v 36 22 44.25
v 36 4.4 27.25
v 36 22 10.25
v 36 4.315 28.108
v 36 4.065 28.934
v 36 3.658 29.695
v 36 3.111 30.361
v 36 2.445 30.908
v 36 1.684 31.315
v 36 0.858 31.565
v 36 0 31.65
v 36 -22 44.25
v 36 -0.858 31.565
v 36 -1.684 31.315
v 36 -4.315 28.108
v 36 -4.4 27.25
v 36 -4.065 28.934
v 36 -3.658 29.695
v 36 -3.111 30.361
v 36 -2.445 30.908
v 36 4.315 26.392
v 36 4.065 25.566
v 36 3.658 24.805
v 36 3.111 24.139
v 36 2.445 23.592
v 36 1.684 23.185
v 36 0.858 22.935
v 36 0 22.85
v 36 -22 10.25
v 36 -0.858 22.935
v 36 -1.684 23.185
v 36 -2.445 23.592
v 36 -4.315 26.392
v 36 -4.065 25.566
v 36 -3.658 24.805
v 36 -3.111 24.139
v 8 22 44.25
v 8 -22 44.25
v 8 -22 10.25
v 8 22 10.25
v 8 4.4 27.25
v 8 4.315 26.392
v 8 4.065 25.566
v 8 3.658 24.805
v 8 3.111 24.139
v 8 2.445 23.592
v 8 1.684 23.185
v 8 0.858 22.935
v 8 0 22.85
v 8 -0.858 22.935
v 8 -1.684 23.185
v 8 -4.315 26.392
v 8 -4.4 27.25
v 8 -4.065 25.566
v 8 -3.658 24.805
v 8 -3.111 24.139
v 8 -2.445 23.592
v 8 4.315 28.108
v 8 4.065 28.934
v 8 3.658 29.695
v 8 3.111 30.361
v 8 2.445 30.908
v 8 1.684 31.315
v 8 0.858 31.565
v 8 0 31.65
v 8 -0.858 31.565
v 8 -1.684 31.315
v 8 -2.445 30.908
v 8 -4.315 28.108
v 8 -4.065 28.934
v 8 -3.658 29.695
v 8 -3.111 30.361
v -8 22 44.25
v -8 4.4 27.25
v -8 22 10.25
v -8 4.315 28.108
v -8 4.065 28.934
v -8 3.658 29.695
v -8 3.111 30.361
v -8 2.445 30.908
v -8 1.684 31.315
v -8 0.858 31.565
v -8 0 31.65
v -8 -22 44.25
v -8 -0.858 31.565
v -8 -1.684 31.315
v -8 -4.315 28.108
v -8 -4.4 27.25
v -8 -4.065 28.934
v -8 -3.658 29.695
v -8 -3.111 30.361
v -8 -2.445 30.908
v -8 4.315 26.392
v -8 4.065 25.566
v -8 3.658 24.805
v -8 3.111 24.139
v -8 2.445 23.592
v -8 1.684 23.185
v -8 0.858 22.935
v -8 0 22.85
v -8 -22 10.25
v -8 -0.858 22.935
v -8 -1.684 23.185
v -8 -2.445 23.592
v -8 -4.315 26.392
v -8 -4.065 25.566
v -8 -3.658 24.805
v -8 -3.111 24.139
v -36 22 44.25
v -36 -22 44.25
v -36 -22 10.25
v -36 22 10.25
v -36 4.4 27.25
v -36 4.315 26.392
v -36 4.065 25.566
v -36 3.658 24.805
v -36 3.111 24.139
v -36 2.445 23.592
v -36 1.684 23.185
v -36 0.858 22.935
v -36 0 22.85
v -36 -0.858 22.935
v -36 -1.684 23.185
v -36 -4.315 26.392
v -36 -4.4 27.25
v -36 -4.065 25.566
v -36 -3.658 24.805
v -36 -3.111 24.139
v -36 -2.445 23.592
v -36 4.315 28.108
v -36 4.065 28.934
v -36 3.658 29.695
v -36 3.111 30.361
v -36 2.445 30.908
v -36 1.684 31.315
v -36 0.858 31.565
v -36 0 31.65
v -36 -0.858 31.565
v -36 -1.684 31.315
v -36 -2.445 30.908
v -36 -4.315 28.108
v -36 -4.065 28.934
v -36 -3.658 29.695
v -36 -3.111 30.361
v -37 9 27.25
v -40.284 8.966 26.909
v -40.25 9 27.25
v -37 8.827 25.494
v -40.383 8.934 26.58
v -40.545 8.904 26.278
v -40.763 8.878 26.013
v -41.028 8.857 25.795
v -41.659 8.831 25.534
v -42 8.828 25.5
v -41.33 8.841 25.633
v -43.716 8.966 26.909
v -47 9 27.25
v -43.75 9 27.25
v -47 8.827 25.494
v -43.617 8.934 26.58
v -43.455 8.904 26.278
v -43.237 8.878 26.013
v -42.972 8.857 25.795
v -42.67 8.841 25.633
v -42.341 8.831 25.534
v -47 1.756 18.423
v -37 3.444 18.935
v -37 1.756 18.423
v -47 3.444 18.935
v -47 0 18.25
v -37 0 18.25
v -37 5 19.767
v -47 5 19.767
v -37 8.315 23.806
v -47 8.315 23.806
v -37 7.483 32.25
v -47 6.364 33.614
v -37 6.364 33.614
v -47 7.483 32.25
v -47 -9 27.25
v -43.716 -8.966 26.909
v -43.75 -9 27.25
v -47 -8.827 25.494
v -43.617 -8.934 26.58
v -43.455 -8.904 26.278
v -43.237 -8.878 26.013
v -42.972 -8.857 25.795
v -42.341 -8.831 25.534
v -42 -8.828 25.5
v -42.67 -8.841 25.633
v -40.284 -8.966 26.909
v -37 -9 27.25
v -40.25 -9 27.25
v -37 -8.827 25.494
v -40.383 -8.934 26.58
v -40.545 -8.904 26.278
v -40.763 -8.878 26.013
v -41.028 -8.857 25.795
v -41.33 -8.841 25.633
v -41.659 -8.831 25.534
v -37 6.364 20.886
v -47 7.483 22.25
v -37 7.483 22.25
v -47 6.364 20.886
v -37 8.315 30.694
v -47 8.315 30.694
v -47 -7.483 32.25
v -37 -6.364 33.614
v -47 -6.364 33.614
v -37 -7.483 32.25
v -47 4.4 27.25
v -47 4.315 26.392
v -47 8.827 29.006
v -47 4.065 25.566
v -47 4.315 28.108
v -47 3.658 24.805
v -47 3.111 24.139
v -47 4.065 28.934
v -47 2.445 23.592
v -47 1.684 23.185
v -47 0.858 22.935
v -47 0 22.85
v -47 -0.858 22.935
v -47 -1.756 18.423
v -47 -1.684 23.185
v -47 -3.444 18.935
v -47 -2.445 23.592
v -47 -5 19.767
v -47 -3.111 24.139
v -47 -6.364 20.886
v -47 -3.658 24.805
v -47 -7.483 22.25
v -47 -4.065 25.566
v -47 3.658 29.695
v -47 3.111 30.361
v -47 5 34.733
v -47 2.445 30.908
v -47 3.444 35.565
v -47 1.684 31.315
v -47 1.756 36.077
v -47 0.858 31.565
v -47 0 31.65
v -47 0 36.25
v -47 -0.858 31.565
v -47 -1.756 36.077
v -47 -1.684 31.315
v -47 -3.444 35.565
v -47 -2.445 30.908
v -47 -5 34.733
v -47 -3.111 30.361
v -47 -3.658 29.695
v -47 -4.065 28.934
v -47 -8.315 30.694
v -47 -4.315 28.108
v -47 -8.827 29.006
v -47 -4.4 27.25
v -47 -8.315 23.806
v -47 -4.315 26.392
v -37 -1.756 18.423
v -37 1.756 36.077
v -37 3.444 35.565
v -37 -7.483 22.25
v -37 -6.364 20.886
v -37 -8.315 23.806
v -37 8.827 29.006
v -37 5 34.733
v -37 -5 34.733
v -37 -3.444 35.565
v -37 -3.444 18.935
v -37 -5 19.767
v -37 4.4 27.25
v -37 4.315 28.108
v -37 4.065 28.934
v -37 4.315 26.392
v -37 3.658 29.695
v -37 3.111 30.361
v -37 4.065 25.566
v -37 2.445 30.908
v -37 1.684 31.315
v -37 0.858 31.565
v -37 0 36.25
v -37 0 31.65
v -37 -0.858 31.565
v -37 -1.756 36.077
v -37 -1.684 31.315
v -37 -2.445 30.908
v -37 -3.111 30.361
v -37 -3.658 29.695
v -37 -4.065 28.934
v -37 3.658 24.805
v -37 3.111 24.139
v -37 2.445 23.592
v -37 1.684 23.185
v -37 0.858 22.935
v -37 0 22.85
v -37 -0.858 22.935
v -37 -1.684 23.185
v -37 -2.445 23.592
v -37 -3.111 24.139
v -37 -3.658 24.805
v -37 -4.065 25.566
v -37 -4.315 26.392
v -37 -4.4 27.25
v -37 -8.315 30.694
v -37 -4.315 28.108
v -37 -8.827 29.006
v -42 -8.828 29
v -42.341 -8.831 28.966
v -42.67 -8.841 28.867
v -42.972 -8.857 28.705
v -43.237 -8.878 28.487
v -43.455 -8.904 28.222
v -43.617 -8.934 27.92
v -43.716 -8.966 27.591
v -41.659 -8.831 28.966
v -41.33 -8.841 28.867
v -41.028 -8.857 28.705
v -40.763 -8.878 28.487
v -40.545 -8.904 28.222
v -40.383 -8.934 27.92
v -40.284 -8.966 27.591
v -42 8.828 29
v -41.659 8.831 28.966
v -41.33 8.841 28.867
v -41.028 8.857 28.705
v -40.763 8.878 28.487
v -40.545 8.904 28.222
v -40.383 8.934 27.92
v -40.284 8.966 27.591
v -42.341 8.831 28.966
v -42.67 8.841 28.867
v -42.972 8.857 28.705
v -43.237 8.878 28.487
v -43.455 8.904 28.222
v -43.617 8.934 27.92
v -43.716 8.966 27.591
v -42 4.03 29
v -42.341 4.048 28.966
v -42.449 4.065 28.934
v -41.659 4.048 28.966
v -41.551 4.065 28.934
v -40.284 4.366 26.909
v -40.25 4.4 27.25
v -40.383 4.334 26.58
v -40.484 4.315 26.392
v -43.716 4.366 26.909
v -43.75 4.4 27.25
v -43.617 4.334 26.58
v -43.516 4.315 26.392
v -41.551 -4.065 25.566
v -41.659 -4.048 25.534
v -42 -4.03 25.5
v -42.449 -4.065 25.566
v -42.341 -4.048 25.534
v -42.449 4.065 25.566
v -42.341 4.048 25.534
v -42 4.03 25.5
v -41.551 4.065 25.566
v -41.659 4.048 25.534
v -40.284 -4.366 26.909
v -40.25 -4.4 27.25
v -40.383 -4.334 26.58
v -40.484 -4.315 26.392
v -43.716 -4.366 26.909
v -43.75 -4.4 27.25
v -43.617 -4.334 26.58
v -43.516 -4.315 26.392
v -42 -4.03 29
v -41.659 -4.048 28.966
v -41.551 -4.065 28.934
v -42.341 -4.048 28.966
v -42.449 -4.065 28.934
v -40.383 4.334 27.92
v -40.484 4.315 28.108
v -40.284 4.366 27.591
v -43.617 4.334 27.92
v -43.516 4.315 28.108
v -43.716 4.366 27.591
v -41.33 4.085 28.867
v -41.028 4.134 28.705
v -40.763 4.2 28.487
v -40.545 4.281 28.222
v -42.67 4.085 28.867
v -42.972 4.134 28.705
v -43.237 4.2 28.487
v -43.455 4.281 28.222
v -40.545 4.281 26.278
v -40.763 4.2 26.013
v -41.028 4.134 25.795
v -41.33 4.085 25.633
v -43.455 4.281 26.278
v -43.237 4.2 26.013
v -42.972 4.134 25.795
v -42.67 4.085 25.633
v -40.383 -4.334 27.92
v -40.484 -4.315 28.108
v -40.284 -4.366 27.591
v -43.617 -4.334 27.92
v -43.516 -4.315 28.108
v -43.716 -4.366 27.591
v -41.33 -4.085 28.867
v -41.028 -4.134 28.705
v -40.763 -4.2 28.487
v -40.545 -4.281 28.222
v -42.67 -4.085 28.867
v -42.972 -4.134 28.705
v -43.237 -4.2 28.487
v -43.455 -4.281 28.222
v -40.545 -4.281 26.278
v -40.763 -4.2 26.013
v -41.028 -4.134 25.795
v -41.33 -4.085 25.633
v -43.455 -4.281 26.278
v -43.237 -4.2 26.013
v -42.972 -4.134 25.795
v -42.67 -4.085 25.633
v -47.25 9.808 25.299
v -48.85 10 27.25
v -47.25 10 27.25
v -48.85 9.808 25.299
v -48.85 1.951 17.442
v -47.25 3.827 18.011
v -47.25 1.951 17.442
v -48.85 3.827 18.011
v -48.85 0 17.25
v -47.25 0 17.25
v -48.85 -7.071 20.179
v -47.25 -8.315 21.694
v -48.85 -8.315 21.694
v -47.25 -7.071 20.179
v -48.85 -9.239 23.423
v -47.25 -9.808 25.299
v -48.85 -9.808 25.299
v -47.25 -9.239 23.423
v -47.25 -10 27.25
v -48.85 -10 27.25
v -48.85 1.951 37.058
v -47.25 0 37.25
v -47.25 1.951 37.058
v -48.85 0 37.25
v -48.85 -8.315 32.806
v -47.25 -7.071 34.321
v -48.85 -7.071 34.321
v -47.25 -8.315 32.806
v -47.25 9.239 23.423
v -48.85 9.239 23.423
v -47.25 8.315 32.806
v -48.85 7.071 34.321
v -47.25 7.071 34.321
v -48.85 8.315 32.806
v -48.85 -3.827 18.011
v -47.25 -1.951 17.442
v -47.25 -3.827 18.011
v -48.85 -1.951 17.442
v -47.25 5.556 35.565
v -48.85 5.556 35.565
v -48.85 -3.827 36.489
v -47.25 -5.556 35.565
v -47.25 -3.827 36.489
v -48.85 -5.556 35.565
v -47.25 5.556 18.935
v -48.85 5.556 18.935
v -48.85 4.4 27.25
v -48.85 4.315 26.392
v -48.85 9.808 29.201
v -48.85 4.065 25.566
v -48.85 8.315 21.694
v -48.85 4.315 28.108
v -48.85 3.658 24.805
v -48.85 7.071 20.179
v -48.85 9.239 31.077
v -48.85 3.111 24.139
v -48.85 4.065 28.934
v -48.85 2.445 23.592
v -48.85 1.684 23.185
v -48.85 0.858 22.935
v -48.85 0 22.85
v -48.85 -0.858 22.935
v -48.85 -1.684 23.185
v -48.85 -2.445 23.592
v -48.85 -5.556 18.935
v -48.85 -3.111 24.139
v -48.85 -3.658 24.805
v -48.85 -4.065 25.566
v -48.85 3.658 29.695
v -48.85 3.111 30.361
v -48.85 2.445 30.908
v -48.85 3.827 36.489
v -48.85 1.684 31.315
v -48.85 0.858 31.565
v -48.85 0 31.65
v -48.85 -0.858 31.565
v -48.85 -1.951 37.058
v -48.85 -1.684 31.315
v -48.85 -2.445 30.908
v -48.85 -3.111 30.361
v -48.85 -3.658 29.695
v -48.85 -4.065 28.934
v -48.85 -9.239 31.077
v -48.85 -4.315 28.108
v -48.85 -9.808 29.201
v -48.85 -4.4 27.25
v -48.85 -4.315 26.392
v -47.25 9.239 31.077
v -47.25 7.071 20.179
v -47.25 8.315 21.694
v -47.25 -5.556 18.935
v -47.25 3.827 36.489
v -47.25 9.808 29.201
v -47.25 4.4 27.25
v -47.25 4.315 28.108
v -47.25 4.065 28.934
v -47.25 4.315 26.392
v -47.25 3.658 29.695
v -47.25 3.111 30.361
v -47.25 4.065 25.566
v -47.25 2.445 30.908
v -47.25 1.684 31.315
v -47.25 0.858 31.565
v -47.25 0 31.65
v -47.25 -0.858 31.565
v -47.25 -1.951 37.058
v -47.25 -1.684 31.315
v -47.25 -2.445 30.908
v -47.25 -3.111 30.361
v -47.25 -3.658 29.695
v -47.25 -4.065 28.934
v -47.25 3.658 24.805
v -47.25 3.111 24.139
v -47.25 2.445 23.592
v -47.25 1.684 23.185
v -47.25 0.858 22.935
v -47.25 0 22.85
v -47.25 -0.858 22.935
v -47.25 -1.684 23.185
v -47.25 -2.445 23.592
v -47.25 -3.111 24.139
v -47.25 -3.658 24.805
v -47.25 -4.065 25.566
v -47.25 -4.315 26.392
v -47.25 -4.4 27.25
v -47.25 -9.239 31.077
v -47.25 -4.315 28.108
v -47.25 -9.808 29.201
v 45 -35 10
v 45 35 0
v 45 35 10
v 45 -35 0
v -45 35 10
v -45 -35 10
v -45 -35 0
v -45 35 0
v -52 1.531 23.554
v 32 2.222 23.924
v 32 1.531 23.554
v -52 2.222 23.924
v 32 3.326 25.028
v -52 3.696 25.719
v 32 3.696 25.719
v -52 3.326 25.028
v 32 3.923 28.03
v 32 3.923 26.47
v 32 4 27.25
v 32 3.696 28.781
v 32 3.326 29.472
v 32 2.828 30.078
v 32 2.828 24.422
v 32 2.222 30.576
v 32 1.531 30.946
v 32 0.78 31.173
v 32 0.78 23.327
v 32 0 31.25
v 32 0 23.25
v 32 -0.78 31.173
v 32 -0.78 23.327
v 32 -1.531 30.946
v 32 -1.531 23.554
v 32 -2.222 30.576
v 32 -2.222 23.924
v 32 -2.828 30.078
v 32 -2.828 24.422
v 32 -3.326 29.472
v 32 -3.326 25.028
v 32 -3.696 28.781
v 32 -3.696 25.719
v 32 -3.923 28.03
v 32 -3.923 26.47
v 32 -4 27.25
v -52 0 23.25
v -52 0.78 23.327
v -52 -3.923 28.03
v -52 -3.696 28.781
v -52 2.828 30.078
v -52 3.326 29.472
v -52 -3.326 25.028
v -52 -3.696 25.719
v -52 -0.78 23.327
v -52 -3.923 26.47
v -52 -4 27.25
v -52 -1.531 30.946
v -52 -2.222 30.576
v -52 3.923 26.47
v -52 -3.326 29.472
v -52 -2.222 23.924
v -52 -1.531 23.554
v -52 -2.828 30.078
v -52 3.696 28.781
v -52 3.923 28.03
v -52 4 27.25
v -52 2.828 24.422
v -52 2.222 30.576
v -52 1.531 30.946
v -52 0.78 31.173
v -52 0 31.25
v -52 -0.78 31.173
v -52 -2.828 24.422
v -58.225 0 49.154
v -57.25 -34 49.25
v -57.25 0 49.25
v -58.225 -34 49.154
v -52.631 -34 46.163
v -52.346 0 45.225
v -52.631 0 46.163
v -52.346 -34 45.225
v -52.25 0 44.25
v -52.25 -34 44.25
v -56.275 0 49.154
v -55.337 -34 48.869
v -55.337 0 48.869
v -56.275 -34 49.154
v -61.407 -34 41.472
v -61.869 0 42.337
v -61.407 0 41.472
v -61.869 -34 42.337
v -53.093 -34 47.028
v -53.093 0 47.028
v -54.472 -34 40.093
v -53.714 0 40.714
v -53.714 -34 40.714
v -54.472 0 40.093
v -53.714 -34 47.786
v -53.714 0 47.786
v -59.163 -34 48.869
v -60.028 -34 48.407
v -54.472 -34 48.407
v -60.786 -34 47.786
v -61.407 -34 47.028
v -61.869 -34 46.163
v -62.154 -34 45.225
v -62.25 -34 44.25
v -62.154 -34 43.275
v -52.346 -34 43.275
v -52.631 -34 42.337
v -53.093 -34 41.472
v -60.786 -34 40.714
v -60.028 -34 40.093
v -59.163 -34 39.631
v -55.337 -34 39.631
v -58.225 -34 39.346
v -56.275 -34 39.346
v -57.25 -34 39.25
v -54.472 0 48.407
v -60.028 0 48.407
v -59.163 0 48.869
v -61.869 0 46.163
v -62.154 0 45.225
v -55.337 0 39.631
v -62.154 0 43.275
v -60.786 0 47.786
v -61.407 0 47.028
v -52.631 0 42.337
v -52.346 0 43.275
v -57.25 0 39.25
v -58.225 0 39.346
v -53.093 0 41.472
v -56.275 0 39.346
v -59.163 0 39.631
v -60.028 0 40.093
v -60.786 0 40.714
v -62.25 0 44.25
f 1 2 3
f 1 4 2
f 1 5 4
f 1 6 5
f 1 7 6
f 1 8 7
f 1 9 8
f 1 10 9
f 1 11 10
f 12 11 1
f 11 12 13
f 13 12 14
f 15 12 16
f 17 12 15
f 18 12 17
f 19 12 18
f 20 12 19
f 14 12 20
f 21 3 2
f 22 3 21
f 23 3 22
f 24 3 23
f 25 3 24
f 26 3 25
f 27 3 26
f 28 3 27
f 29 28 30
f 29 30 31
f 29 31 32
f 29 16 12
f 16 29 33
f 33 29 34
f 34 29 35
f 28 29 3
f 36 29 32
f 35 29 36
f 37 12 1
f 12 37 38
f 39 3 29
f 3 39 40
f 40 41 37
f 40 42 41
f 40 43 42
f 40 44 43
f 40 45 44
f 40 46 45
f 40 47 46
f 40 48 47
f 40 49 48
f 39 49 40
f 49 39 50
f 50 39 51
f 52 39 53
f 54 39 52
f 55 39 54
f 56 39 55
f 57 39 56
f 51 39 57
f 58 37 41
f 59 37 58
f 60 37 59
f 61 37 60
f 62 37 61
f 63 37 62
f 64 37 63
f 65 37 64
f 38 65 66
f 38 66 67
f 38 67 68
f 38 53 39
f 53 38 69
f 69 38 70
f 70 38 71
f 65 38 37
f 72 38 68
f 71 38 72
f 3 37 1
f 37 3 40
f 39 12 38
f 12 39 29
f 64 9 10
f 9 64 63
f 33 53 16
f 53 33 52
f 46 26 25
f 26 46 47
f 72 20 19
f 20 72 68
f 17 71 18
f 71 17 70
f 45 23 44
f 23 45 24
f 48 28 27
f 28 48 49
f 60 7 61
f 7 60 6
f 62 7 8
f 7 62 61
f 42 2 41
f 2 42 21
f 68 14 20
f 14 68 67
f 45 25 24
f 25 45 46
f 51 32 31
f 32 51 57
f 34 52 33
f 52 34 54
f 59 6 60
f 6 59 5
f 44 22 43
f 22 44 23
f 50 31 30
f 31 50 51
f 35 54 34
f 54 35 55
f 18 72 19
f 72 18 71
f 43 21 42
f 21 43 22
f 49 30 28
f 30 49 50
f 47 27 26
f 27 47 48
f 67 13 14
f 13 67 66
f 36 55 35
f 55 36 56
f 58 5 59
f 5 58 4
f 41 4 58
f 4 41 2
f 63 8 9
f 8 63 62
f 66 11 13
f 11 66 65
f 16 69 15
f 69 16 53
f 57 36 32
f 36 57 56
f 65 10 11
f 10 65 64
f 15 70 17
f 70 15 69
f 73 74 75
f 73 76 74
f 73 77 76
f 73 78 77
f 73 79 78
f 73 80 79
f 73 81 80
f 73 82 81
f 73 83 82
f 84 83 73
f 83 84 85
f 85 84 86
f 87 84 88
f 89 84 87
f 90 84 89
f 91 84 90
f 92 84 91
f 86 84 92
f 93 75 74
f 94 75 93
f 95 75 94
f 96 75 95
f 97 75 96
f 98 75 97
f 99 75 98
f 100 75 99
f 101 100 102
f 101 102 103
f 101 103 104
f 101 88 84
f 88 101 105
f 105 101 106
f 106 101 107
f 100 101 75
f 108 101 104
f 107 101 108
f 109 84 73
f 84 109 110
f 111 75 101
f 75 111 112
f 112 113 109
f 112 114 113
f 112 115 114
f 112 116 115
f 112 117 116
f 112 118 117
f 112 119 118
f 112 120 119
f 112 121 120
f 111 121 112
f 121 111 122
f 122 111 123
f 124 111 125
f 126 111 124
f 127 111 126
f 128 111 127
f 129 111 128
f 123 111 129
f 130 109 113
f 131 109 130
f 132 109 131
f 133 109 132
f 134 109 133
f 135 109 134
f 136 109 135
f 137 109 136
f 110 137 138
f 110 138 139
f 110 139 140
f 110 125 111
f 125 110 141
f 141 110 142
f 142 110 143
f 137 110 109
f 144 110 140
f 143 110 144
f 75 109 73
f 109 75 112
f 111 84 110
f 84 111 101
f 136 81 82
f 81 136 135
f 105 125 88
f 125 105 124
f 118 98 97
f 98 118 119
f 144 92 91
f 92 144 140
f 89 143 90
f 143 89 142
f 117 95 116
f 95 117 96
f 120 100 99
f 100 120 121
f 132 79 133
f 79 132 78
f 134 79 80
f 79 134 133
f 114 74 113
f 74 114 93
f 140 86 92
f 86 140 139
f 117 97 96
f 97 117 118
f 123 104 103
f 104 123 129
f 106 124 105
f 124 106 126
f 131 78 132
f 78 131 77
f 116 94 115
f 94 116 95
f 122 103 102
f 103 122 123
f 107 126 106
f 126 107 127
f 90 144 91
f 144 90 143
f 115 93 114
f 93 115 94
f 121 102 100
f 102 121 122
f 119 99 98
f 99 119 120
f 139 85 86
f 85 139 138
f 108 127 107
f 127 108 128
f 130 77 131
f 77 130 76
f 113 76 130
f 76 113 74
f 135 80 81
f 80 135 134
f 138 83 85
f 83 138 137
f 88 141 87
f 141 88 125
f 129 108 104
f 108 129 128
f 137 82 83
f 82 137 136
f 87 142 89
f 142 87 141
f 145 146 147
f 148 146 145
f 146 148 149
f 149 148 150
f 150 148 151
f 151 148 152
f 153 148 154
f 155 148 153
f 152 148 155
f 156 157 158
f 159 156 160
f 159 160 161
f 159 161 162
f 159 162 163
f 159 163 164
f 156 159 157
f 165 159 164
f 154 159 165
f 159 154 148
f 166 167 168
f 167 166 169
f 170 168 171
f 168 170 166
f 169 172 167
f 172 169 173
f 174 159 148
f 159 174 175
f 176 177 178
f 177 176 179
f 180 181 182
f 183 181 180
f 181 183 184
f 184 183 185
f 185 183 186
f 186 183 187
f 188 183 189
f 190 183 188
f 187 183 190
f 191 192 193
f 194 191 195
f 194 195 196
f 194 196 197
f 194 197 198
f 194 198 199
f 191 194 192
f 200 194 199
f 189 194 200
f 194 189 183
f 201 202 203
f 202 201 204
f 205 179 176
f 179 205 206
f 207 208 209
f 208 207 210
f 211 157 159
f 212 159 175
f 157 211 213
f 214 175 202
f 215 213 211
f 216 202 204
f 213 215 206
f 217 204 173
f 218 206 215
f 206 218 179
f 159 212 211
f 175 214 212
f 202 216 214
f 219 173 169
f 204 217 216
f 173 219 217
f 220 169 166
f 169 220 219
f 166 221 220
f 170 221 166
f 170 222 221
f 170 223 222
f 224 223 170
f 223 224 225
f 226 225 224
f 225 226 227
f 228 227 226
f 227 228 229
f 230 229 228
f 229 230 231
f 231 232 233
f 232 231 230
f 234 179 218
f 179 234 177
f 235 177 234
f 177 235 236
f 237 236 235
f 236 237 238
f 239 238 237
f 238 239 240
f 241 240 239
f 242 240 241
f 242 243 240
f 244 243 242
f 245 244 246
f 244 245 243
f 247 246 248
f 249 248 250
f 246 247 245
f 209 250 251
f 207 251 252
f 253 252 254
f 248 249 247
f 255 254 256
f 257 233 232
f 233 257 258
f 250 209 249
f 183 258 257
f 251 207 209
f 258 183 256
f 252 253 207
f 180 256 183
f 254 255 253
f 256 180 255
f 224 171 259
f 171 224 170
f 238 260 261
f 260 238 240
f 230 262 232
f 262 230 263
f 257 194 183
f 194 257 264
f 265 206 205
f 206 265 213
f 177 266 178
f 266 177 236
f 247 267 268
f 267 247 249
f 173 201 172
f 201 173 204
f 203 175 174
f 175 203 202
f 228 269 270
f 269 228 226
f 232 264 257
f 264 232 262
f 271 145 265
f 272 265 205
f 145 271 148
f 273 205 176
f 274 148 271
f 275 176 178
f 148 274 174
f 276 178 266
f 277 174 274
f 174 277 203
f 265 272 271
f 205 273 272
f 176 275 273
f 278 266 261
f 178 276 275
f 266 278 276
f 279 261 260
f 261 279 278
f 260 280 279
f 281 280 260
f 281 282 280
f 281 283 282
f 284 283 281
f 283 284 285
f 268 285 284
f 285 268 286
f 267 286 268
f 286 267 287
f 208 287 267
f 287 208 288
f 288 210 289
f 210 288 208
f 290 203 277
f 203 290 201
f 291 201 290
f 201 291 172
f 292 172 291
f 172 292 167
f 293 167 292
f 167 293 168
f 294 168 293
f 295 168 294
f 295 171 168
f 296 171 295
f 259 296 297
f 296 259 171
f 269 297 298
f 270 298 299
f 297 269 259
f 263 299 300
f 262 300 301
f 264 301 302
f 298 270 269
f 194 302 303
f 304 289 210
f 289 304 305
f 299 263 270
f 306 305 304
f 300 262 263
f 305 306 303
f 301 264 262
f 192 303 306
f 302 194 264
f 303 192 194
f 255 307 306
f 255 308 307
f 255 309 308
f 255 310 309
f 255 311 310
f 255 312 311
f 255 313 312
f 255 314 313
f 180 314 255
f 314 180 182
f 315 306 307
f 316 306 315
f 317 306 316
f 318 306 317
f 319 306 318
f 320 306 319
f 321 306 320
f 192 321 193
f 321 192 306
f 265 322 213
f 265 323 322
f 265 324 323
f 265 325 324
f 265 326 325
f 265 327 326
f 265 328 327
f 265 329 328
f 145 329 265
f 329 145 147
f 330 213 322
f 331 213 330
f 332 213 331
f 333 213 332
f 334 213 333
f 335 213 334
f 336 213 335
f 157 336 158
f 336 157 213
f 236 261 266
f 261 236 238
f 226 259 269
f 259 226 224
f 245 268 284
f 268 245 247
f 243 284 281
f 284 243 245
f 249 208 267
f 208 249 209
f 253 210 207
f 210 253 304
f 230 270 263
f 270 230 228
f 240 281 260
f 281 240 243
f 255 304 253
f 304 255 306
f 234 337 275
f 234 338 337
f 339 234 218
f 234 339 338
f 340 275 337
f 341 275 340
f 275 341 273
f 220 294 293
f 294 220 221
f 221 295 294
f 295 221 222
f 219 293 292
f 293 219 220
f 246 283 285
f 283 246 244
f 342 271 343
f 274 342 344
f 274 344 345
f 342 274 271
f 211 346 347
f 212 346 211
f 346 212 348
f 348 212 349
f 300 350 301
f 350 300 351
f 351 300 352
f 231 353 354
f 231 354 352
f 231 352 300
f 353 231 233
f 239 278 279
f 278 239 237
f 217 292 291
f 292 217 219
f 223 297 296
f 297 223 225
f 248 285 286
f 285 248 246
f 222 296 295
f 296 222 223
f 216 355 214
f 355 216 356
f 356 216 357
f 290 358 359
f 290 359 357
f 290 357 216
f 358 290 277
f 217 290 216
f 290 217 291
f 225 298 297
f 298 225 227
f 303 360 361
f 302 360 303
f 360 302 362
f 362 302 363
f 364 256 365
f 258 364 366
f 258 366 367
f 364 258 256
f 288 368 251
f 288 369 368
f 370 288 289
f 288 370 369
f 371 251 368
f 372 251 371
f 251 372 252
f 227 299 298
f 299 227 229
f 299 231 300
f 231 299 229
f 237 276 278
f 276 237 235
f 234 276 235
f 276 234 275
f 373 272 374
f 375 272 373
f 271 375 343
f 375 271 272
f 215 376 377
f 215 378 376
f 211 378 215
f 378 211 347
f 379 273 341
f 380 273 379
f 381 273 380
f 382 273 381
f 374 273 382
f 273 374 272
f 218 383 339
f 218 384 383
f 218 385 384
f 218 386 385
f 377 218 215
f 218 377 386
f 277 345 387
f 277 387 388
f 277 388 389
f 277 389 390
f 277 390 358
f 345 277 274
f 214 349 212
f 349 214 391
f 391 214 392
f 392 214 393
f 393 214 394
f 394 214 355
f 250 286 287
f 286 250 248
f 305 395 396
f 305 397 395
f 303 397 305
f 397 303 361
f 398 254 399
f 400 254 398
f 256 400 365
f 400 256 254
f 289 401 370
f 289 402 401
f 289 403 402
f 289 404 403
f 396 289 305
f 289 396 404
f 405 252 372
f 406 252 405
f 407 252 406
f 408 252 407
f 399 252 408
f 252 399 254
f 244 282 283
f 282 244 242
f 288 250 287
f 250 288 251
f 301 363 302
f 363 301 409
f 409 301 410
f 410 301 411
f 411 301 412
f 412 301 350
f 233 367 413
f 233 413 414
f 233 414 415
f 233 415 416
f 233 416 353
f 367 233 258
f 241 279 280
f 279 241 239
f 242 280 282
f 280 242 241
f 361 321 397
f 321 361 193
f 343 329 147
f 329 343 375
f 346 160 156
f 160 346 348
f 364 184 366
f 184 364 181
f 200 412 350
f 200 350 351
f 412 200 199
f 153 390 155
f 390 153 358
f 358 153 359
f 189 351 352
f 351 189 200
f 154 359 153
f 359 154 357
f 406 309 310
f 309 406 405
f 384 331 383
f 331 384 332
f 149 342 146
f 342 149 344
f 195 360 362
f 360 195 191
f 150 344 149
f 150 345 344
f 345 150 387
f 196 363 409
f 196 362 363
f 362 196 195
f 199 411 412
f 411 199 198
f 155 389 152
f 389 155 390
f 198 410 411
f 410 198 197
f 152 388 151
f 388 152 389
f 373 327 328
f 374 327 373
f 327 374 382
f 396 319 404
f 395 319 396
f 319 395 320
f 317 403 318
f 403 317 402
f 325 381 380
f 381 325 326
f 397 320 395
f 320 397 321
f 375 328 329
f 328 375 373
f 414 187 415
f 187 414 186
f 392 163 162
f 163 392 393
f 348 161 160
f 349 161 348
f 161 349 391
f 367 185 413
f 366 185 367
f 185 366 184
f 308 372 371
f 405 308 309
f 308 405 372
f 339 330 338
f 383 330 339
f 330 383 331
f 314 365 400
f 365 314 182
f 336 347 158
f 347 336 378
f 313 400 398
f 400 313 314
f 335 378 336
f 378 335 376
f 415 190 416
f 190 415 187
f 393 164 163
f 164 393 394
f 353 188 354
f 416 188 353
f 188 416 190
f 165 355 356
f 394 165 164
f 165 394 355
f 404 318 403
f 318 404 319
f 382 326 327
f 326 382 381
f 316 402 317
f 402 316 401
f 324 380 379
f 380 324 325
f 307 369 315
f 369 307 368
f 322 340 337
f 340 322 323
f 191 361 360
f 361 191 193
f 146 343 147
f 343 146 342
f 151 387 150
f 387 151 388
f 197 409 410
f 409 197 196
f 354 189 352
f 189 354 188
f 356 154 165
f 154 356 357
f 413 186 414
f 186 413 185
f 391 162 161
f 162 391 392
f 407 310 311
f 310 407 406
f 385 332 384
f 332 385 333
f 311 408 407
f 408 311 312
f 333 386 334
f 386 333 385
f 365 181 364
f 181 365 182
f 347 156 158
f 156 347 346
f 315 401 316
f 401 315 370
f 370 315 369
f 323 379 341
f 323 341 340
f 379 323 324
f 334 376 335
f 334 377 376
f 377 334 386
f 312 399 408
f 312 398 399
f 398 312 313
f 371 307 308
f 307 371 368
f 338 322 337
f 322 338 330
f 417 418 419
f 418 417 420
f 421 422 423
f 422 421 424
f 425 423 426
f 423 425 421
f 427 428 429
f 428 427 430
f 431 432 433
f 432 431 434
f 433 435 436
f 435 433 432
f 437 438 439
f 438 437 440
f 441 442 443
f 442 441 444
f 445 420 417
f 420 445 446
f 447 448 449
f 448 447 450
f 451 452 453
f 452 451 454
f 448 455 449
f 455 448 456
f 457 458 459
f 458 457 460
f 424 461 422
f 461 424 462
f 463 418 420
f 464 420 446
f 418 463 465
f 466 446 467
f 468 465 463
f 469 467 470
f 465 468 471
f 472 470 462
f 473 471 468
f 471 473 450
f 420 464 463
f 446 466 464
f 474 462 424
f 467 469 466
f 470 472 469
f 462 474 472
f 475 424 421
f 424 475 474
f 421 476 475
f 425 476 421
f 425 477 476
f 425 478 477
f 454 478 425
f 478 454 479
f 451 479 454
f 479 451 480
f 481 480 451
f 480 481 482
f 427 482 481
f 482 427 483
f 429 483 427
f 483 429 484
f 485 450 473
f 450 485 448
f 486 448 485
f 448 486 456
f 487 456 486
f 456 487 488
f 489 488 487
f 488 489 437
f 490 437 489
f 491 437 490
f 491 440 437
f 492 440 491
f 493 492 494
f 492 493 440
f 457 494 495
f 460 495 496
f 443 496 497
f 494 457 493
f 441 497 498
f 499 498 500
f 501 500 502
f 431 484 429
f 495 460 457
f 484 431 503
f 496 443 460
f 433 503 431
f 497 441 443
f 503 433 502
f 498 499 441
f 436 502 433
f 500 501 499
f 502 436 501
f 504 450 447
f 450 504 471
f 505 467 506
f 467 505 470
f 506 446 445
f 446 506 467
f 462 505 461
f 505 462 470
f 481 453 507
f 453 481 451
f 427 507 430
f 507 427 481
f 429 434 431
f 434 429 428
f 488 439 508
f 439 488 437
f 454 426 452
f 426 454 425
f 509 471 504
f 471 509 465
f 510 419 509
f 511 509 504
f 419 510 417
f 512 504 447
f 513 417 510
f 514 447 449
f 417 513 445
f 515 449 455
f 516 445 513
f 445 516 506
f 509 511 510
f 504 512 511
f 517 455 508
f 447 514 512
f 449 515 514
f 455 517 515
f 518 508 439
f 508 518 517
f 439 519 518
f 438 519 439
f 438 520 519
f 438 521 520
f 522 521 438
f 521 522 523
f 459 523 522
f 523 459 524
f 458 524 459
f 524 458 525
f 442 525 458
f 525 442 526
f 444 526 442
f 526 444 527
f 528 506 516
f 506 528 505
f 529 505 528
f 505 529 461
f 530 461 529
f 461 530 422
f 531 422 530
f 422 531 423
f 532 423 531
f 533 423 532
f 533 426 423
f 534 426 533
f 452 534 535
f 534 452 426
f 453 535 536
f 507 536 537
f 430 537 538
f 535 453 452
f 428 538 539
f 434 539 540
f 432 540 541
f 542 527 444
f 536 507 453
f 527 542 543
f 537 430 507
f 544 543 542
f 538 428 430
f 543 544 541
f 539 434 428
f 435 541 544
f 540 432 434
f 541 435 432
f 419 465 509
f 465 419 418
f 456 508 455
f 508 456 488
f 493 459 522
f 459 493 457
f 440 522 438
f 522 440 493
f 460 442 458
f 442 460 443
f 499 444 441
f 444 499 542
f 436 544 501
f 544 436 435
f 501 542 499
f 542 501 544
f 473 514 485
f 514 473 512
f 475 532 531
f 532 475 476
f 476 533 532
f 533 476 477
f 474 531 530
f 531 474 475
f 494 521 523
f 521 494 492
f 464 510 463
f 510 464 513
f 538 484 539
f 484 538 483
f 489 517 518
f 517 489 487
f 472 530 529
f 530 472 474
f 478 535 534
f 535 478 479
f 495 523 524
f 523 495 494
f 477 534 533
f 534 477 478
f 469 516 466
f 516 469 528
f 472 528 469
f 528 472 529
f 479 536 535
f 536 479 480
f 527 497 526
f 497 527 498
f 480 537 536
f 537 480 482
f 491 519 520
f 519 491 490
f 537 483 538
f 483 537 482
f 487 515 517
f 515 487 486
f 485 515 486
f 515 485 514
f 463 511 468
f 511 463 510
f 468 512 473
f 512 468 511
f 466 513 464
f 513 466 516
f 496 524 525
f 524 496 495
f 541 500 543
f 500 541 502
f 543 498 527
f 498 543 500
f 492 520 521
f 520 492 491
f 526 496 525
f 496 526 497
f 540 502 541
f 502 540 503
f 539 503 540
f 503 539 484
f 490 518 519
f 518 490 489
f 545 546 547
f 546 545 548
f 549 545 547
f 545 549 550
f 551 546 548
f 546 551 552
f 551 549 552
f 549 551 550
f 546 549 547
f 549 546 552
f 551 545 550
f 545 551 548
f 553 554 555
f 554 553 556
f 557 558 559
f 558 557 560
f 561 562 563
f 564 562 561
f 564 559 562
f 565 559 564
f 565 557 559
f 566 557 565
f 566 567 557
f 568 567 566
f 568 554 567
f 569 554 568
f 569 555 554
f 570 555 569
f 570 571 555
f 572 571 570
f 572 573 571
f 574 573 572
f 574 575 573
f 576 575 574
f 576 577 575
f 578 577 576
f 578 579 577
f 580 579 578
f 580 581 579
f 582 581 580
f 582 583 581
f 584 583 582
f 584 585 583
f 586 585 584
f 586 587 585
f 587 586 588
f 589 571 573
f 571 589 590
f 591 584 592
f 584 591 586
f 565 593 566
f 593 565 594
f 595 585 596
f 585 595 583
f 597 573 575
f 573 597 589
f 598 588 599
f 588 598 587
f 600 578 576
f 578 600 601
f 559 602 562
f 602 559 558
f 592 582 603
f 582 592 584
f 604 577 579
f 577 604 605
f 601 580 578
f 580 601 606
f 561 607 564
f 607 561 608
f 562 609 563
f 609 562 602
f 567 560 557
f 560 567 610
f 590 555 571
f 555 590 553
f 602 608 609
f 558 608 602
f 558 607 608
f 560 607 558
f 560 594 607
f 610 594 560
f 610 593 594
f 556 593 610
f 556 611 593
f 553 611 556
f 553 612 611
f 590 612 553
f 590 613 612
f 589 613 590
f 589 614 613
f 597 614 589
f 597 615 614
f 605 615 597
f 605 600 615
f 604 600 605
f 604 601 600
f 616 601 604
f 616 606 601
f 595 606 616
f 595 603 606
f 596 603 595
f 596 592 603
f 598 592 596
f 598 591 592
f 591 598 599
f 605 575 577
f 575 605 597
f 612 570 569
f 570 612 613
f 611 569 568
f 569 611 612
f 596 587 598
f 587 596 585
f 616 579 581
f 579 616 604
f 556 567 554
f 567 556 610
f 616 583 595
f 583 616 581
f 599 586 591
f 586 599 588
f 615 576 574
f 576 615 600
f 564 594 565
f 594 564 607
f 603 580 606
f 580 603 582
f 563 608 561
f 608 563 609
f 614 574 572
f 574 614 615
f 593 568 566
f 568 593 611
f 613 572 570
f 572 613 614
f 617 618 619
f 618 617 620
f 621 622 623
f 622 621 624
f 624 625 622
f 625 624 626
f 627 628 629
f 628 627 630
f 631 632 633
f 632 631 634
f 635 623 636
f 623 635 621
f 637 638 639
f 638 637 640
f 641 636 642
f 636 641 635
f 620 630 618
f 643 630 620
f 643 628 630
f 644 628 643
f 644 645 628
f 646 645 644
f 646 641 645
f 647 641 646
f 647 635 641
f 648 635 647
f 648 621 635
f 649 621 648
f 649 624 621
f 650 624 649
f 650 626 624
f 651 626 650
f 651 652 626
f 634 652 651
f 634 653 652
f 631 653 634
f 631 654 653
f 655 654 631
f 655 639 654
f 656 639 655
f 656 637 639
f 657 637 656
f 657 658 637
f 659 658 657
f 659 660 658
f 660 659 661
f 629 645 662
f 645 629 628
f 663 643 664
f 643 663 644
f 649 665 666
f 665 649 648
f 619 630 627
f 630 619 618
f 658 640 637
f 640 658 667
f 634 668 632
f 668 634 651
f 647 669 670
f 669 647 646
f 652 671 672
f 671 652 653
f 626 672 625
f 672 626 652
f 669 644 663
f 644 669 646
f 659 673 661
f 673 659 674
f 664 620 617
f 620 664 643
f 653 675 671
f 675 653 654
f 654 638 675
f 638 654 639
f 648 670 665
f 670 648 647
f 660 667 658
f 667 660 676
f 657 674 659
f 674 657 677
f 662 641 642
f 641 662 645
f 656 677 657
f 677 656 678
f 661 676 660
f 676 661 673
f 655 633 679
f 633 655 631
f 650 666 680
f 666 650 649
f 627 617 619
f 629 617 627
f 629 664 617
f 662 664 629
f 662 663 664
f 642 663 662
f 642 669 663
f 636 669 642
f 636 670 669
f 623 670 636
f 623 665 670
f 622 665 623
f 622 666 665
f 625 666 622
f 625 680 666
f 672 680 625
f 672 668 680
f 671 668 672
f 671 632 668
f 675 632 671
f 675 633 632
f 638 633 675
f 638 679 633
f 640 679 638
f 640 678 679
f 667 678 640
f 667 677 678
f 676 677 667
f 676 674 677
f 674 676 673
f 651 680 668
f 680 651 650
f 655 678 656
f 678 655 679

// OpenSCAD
$fn = 32;

// ------------------------------------------------------------------------
// Machine vise: screw d8, jaws 28 x 34 mm
// Every part is its own module, assembly() places every instance.
// ------------------------------------------------------------------------

// --- part 1 ---
module vise_bed() {
  difference() {
    translate([-45, -35, 0]) cube([90, 70, 10]);
  }
}

// --- part 2 ---
module vise_jaw() {
  difference() {
    translate([-14, -22, 0]) cube([28, 44, 34]);
    translate([0, 0, 17]) rotate([0, 90, 0]) cylinder(h = 30, d = 8.8, center = true);
  }
}

// --- part 3 ---
module vise_screw() {
  translate([0, 0, -42]) cylinder(h = 84, d = 8);
}

// --- part 4 ---
module screw_collar() {
  difference() {
    cylinder(h = 10, d = 18);
    translate([0, 0, -1]) cylinder(h = 12, d = 8.8);
    translate([0, 0, 5]) rotate([90, 0, 0]) cylinder(h = 20, d = 3.5, center = true);
  }
}

// --- part 5 ---
module screw_washer() {
  difference() {
      translate([0, 0, 0]) cylinder(h = 1.6, d = 20);
      translate([0, 0, -1]) cylinder(h = 3.6, d = 8.8);
    }
}

// --- part 6 ---
module vise_handle() {
  cylinder(h = 34, d = 10);
}

// --- assembly ---
module assembly() {
  color([0.80, 0.24, 0.20]) translate([0, 0, 0]) rotate([0, 0, 0]) vise_bed();
  color([0.20, 0.45, 0.75]) translate([22, 0, 10.25]) rotate([0, 0, 0]) vise_jaw();
  color([0.25, 0.62, 0.32]) translate([-22, 0, 10.25]) rotate([0, 0, 0]) vise_jaw();
  color([0.92, 0.70, 0.18]) translate([-10, 0, 27.25]) rotate([0, 90, 0]) vise_screw();
  color([0.58, 0.35, 0.70]) translate([-47, 0, 27.25]) rotate([0, 90, 0]) screw_collar();
  color([0.16, 0.66, 0.66]) translate([-48.85, 0, 27.25]) rotate([0, 90, 0]) screw_washer();
  color([0.85, 0.48, 0.18]) translate([-57.25, 0, 44.25]) rotate([90, 0, 0]) vise_handle();
}

assembly();
